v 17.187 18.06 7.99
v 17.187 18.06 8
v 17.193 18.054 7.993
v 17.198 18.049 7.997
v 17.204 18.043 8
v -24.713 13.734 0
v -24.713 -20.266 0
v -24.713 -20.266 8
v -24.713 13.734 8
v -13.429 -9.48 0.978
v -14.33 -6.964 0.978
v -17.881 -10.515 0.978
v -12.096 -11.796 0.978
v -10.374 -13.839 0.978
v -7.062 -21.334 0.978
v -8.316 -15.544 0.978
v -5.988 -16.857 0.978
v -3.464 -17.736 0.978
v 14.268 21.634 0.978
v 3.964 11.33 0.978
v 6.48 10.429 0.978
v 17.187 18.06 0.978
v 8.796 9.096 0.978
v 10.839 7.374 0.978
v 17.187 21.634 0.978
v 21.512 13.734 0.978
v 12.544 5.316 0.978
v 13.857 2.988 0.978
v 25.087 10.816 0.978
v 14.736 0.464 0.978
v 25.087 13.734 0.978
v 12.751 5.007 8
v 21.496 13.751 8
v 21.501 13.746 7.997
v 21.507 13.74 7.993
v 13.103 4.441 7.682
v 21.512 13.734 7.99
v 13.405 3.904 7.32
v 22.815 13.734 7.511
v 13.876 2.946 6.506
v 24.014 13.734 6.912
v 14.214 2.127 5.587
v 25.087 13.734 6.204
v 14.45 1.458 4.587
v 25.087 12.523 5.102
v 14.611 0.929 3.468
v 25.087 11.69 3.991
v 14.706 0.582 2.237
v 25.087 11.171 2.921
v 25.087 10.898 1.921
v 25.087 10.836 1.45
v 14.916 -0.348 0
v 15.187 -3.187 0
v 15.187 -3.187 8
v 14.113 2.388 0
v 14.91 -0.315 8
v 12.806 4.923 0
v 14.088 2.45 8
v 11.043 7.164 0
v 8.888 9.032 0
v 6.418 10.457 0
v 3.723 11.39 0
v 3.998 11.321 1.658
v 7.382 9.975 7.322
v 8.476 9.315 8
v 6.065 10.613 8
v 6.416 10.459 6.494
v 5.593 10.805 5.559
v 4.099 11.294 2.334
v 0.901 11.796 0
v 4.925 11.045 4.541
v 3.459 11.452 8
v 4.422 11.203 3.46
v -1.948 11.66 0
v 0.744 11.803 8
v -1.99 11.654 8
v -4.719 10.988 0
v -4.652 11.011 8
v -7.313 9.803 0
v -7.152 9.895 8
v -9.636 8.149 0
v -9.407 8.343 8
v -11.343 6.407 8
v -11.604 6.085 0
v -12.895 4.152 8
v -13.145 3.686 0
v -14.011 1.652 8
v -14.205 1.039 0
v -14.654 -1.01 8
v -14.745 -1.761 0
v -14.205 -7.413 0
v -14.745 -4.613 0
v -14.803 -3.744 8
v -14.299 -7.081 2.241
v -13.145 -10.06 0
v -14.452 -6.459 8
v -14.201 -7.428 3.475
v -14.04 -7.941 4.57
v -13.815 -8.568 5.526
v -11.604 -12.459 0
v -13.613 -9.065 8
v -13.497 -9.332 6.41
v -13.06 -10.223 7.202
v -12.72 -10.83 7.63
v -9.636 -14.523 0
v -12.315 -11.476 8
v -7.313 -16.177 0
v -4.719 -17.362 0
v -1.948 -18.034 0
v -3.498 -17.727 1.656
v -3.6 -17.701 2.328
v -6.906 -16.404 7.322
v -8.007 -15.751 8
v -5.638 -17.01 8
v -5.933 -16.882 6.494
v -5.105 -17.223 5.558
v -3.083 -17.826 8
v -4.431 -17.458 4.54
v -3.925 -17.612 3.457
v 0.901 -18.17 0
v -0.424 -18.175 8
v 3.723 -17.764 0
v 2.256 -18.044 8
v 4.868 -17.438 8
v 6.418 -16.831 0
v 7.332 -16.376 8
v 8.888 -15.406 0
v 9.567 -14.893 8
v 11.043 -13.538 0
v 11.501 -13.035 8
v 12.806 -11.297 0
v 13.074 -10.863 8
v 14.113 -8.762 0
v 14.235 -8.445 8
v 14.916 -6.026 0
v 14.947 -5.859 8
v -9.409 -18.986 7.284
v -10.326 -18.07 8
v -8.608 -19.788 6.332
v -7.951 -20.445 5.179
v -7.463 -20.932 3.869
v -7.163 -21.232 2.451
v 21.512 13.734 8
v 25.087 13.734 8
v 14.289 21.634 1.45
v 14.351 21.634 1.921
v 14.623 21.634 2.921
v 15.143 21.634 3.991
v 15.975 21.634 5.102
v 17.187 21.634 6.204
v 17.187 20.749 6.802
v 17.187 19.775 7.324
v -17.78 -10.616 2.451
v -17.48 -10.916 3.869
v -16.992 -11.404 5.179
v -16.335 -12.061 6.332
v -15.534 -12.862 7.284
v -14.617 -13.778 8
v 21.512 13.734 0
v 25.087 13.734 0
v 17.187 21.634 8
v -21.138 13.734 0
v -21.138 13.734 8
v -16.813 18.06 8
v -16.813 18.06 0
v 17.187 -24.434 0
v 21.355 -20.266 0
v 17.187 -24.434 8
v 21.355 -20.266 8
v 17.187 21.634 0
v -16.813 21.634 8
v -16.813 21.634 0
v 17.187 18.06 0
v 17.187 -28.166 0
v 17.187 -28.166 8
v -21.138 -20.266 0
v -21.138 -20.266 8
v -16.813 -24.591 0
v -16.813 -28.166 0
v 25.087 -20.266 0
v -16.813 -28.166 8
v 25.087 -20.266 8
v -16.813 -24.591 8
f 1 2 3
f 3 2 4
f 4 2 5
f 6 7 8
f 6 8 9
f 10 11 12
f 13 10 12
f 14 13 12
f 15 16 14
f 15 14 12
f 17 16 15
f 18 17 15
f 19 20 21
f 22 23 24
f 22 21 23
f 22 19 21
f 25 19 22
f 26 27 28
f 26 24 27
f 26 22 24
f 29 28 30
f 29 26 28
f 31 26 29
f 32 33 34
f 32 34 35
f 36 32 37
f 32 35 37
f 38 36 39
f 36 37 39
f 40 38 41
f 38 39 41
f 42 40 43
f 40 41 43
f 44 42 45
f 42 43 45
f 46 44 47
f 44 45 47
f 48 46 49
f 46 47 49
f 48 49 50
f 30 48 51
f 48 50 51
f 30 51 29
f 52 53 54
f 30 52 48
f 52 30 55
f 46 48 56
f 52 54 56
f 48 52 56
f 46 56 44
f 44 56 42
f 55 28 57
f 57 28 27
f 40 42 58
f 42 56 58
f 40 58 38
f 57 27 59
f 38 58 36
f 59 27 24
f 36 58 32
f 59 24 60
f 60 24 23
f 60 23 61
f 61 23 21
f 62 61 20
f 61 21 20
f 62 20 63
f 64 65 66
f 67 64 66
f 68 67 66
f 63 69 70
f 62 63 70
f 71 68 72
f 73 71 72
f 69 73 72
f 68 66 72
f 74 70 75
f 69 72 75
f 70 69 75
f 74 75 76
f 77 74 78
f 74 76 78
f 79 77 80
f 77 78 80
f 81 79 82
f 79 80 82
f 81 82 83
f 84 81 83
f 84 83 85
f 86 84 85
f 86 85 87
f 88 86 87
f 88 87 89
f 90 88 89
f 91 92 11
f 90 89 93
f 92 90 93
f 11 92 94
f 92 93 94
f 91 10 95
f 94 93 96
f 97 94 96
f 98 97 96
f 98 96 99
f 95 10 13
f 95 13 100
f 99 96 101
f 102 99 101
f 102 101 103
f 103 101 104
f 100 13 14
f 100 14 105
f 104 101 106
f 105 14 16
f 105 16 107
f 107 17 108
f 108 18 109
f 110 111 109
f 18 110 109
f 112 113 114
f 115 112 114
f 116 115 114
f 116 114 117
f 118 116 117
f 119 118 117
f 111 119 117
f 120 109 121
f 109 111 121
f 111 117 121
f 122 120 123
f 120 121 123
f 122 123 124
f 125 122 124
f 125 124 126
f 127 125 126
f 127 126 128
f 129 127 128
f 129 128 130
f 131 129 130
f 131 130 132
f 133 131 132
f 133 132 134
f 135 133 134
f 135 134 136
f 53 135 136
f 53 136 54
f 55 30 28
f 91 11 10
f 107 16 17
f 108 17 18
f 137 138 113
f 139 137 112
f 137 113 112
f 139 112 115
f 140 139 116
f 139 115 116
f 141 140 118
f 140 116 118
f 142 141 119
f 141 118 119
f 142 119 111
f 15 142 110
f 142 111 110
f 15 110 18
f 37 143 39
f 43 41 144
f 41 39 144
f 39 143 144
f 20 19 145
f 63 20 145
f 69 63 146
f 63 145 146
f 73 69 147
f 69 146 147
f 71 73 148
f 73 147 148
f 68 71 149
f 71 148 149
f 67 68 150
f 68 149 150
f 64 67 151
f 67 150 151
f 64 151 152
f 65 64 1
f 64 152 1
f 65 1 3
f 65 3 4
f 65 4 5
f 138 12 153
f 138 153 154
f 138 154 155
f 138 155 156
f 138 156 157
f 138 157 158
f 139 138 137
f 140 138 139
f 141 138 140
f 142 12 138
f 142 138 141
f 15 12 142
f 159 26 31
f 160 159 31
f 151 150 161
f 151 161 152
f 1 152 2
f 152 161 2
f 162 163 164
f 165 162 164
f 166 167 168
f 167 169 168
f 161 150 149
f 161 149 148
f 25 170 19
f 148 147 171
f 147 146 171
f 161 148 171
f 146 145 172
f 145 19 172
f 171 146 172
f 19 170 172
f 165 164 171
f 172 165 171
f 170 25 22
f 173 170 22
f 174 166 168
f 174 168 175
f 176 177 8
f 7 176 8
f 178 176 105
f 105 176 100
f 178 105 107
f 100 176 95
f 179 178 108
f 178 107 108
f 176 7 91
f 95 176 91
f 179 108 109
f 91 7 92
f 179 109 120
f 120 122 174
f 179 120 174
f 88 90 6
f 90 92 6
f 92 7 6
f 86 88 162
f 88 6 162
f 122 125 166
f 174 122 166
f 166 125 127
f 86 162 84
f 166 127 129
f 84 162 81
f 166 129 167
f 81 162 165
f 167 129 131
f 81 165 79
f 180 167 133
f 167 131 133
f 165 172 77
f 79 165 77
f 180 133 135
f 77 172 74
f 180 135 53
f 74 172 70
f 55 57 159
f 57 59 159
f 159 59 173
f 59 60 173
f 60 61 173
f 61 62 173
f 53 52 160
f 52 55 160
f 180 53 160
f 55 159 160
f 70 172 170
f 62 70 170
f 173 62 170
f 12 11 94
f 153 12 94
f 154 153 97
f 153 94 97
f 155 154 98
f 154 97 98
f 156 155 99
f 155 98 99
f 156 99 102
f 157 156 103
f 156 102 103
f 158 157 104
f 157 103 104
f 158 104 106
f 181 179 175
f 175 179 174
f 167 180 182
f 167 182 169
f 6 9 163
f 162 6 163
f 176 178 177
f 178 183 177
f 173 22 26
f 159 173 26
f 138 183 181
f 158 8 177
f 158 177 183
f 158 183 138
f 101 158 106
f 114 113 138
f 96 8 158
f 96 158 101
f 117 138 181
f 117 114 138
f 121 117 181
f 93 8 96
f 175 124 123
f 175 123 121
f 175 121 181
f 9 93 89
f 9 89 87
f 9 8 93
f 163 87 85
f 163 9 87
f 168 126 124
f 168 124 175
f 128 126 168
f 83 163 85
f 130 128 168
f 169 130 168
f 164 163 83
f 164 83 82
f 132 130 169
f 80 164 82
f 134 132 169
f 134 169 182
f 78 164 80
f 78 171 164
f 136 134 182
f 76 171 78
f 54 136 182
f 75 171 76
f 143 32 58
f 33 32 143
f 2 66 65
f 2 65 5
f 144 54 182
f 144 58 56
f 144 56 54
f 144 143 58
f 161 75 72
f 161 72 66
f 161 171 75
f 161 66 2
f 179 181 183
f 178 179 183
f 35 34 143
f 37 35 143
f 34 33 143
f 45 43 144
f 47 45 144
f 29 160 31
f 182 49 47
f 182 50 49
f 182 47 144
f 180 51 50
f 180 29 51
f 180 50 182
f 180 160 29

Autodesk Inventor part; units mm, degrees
ref_plane "YZ Plane" through (0, 0, 0) normal (1, 0, 0) x (0, 1, 0)
ref_plane "XZ Plane" through (0, 0, 0) normal (0, 1, 0) x (-1, 0, 0)
ref_plane "XY Plane" through (0, 0, 0) normal (0, 0, 1) x (1, 0, 0)
sketch "Sketch1" plane through (0, 0, 0) normal (0, 0, 1) x (1, 0, 0)
  line L0 (21.5871, 13.6345) -> (17.0871, 18.1345) projected
  line L1 (17.0871, 18.1345) -> (-16.7129, 18.1345) projected
  line L2 (-16.7129, 18.1345) -> (-21.2129, 13.6345) projected
  line L3 (-21.0966, 13.6345) -> (-21.0966, -20.1655) projected
  line L4 (21.4709, -20.1655) -> (21.4709, 13.6345) projected
  line L5 (21.4709, -20.1655) -> (17.0871, -24.4078) projected
  line L6 (-16.7129, -24.4078) -> (17.0871, -24.4078) projected
  line L7 (-16.7129, -24.4078) -> (-21.0966, -20.1655) projected
  line L8 (-24.7129, -28.1655) -> (-24.7129, 13.6345) construction
  line L9 (25.0871, -28.1655) -> (-24.7129, -28.1655) construction
  line L10 (25.0871, -28.1655) -> (25.0871, 13.6345) construction
  line L11 (17.0871, 21.6345) -> (-16.7129, 21.6345) construction
  line L12 (-21.0552, -20.0655) -> (-16.6129, -24.5078)
  line L13 (-16.6129, -24.5078) -> (-16.6129, -28.1655)
  line L14 (-16.6129, -28.1655) -> (17.0871, -28.1655)
  line L15 (25.0871, -20.0655) -> (21.4295, -20.0655)
  line L16 (25.0871, 13.5345) -> (25.0871, -20.0655)
  line L17 (21.4295, 13.5345) -> (25.0871, 13.5345)
  line L18 (21.4295, 13.5345) -> (16.9871, 17.9768)
  line L19 (16.9871, 17.9768) -> (16.9871, 21.6345)
  line L20 (16.9871, 21.6345) -> (-16.6129, 21.6345)
  line L21 (-16.6129, 21.6345) -> (-16.6129, 17.9768)
  line L22 (-16.6129, 17.9768) -> (-21.0552, 13.5345)
  line L23 (-24.7129, 13.5345) -> (-21.0552, 13.5345)
  line L24 (-24.7129, -20.0655) -> (-24.7129, 13.5345)
  line L25 (-21.0552, -20.0655) -> (-24.7129, -20.0655)
  line L26 (-12.3129, -23.2655) -> (12.6871, -23.2655) projected
  line L27 (12.6871, -23.2655) -> (12.6871, 16.7345) projected
  line L28 (-12.3129, 16.7345) -> (12.6871, 16.7345) projected
  line L29 (-12.3129, -23.2655) -> (-12.3129, 16.7345) projected
  line L30 (14.6871, -25.2655) -> (-14.3129, -25.2655) construction
  line L31 (-14.3129, -25.2655) -> (-14.3129, 18.7345) construction
  line L32 (-14.3129, 18.7345) -> (14.6871, 18.7345) construction
  line L33 (14.6871, 18.7345) -> (14.6871, -25.2655) construction
  line L34 (-17.3129, 21.7345) -> (17.6871, 21.7345) construction
  line L35 (17.6871, 21.7345) -> (17.6871, -28.2655) construction
  line L36 (17.6871, -28.2655) -> (-17.3129, -28.2655) construction
  line L37 (-17.3129, -28.2655) -> (-17.3129, 21.7345) construction
  line L38 (-14.3129, -23.2655) -> (-14.3129, -25.2655)
  line L39 (-14.3129, -25.2655) -> (14.6871, -25.2655)
  line L40 (14.6871, -25.2655) -> (14.6871, -20.0655)
  line L41 (14.6871, -20.0655) -> (17.6871, -20.0655)
  line L42 (17.6871, -20.0655) -> (17.6871, 13.5345)
  line L43 (17.6871, 13.5345) -> (14.6871, 13.5345)
  line L44 (14.6871, 13.5345) -> (14.6871, 18.7345)
  line L45 (14.6871, 18.7345) -> (-14.3129, 18.7345)
  line L46 (-14.3129, 18.7345) -> (-14.3129, 13.5345)
  line L47 (-14.3129, 13.5345) -> (-17.3129, 13.5345)
  line L48 (-17.3129, 13.5345) -> (-17.3129, -20.0655)
  line L49 (-17.3129, -20.0655) -> (-14.3129, -20.0655)
  line L50 (-14.3129, -20.0655) -> (-14.3129, -23.2655)
  line L51 (-16.6129, -28.1655) -> (17.0871, -28.1655)
  line L52 (16.9871, -28.1655) -> (16.9871, -24.3509)
  line L53 (16.9871, -24.3509) -> (21.2726, -20.0655)
  line L54 (21.2726, -20.0655) -> (21.4295, -20.0655)
  point P0 (14.2, -44.8454)
  point P1 (16.9871, 19.8057)
  dimension "d74" = 2
  dimension "d75" = 5
  dimension "d76" = 135
extrude "Extrusion1" add sketch "Sketch1" along normal blind 8 contours L19 L18 L17 L4 L15 L54 L53 L52 L6 L40 L41 L42 L43 L44 L1 | L1 L44 L45 L46 L21 L20 L19 | L44 L43 L42 L41 L40 L6 L38 L50 L49 L48 L47 L46 L1 | L1 L46 L45 L44 | L46 L47 L48 L49 L50 L38 L6 L12 L25 L3 L23 L22 L21 L1 | L17 L16 L15 L4 | L3 L25 L24 L23 | L40 L39 L38 L6 | L6 L52 L14 L13 L12 L38 L39 L40 | L29 L28 L27 L26
sketch "Skizze7" plane through (0, 0, 8) normal (0, 0, 1) x (1, 0, 0)
  line L0 (-21.0552, -20.0655) -> (-16.6129, -24.5078) projected
  line L1 (-16.6129, -24.5078) -> (-16.6129, -28.1655) projected
  line L2 (-16.6129, -28.1655) -> (16.9871, -28.1655) construction
  line L3 (16.9871, -28.1655) -> (16.9871, -24.3509) projected
  line L4 (16.9871, -24.3509) -> (21.2726, -20.0655) projected
  line L5 (21.2726, -20.0655) -> (25.0871, -20.0655) projected
  line L6 (25.0871, -20.0655) -> (25.0871, 13.5345) construction
  line L7 (25.0871, 13.5345) -> (21.4295, 13.5345) projected
  line L8 (21.4295, 13.5345) -> (16.9871, 17.9768) projected
  line L9 (16.9871, 17.9768) -> (16.9871, 21.6345) projected
  line L10 (16.9871, 21.6345) -> (-16.6129, 21.6345) construction
  line L11 (-16.6129, 21.6345) -> (-16.6129, 17.9768) projected
  line L12 (-16.6129, 17.9768) -> (-21.0552, 13.5345) projected
  line L13 (-21.0552, 13.5345) -> (-24.7129, 13.5345) projected
  line L14 (-24.7129, 13.5345) -> (-24.7129, -20.0655) construction
  line L15 (-24.7129, -20.0655) -> (-21.0552, -20.0655) projected
  line L16 (-16.8129, 21.8345) -> (17.1871, 21.8345) construction
  line L17 (17.1871, 21.8345) -> (17.1871, 18.0597)
  line L18 (17.1871, 18.0597) -> (21.5123, 13.7345)
  line L19 (21.5123, 13.7345) -> (25.2871, 13.7345)
  line L20 (25.2871, 13.7345) -> (25.2871, -20.2655) construction
  line L21 (25.2871, -20.2655) -> (21.3554, -20.2655)
  line L22 (21.3554, -20.2655) -> (17.1871, -24.4338)
  line L23 (17.1871, -24.4338) -> (17.1871, -28.3655)
  line L24 (17.1871, -28.3655) -> (-16.8129, -28.3655) construction
  line L25 (-16.8129, -28.3655) -> (-16.8129, -24.5907)
  line L26 (-16.8129, -24.5907) -> (-21.1381, -20.2655)
  line L27 (-21.1381, -20.2655) -> (-24.9129, -20.2655)
  line L28 (-24.9129, -20.2655) -> (-24.9129, 13.7345) construction
  line L29 (-24.9129, 13.7345) -> (-21.1381, 13.7345)
  line L30 (-21.1381, 13.7345) -> (-16.8129, 18.0597)
  line L31 (-16.8129, 18.0597) -> (-16.8129, 21.8345)
  line L32 (-21.0552, 13.5345) -> (-24.7129, 13.5345) projected
  line L33 (-24.7129, 13.5345) -> (-24.7129, 13.7345)
  line L34 (-16.6129, 21.6345) -> (-16.6129, 17.9768) projected
  line L35 (-16.6129, 21.6345) -> (-16.8129, 21.6345)
  line L36 (25.0871, -20.0655) -> (25.0871, 13.5345) projected
  line L37 (25.0871, 13.5345) -> (25.0871, 13.7345)
  line L38 (16.9871, 21.6345) -> (17.1871, 21.6345)
  line L39 (16.9871, -28.1655) -> (17.1871, -28.1655)
  line L40 (25.0871, -20.0655) -> (25.0871, -20.2655)
  line L41 (-16.6129, -28.1655) -> (-16.8129, -28.1655)
  line L42 (-24.7129, -20.0655) -> (-24.7129, -20.2655)
  dimension "d94" = 0.2
extrude "IM_offset" add sketch "Skizze7" against normal up to surface (8 mm away)
sketch "Sketch8" plane through (-1.6003, 36.8471, 0) normal (0.7071, 0.7071, 0) x (0.7071, -0.7071, 0)
  arc A0 (21.9778, -0.9777) -> (37.2778, -0.9777) centre (29.6278, -0.9777) ccw
  line L0 (21.9778, -0.9777) -> (37.2778, -0.9777) construction
  line L1 (21.9778, -0.9777) -> (37.2778, -0.9777) construction
  line L2 (21.9778, -0.9777) -> (37.2778, -0.9777)
  point P0 (27.1864, 0)
  point P1 (29.6278, -1.0154)
  dimension "d98" = 15.3
  dimension "d99" = 0
  dimension "d100" = 7.65
extrude "Extrusion7" cut sketch "Sketch8" against normal blind 45 and the other way blind 22.5
sketch "Sketch9" plane through (0, 0, 8) normal (0, 0, 1) x (1, 0, 0)
  line L0 (17.1871, 21.6345) -> (-16.8129, 21.6345) projected
  line L1 (-24.7129, 13.7345) -> (-24.7129, -20.2655) projected
  line L2 (17.1871, -28.1655) -> (-16.8129, -28.1655) projected
  line L3 (25.0871, -20.0655) -> (25.0871, 13.7345) projected
  circle A0 centre (0.1871, -3.187) radius 27.0445
  circle A1 centre (0.1871, -3.187) radius 15
  line L4 (-16.8129, 21.6345) -> (-16.8129, 18.0597) projected
  line L5 (-16.8129, 18.0597) -> (-21.1381, 13.7345) projected
  line L6 (-21.1381, 13.7345) -> (-24.7129, 13.7345) projected
  line L7 (17.1871, -28.1655) -> (17.1871, -24.4338) projected
  line L8 (17.1871, -24.4338) -> (21.3554, -20.2655) projected
  line L9 (21.3554, -20.2655) -> (25.0871, -20.2655) projected
  line L10 (25.0871, -20.2655) -> (25.0871, -20.0655) projected
  line L11 (25.0871, 13.7345) -> (21.5123, 13.7345) projected
  line L12 (21.5123, 13.7345) -> (21.4956, 13.7512) projected
  line L13 (17.1871, 18.0597) -> (17.1871, 21.6345) projected
  line L14 (-21.1381, -20.2655) -> (-24.7129, -20.2655) projected
  line L15 (-16.8129, -24.5907) -> (-21.1381, -20.2655) projected
  line L16 (-16.8129, -28.1655) -> (-16.8129, -24.5907) projected
  line L17 (21.4956, 13.7512) -> (-10.3242, -18.0686) projected
  line L18 (-10.3242, -18.0686) -> (-14.6159, -13.7769) projected
  line L19 (-14.6159, -13.7769) -> (17.2039, 18.043) projected
  line L20 (17.2039, 18.043) -> (17.1871, 18.0597) projected
  point P0 (0, 0)
  dimension "d91" = 30
extrude "Extrusion8" cut sketch "Sketch9" against normal through all contours L19 A1 | A1 L17 L19 | A1 L17
sketch "Sketch10" plane through (21.5123, 13.7345, 1.6478) normal (0.7071, 0.7071, 0) x (0, 0, -1)
  line L0 (-6.3522, 0.0237) -> (-6.3522, 6.0931) projected
  arc A0 (-6.3522, 0.0237) -> (0.6701, -4.5916) centre (0.6701, 3.0584) ccw projected
  line L1 (0.6701, 10.7084) -> (0.6701, -4.5916) projected
  arc A1 (0.6701, 10.7084) -> (-6.3522, 6.0931) centre (0.6701, 3.0584) ccw projected
  point P0 (1.6478, 5.4998)
properties part number "20_Cube_Insert_Lens_Cylindrical_v3"
